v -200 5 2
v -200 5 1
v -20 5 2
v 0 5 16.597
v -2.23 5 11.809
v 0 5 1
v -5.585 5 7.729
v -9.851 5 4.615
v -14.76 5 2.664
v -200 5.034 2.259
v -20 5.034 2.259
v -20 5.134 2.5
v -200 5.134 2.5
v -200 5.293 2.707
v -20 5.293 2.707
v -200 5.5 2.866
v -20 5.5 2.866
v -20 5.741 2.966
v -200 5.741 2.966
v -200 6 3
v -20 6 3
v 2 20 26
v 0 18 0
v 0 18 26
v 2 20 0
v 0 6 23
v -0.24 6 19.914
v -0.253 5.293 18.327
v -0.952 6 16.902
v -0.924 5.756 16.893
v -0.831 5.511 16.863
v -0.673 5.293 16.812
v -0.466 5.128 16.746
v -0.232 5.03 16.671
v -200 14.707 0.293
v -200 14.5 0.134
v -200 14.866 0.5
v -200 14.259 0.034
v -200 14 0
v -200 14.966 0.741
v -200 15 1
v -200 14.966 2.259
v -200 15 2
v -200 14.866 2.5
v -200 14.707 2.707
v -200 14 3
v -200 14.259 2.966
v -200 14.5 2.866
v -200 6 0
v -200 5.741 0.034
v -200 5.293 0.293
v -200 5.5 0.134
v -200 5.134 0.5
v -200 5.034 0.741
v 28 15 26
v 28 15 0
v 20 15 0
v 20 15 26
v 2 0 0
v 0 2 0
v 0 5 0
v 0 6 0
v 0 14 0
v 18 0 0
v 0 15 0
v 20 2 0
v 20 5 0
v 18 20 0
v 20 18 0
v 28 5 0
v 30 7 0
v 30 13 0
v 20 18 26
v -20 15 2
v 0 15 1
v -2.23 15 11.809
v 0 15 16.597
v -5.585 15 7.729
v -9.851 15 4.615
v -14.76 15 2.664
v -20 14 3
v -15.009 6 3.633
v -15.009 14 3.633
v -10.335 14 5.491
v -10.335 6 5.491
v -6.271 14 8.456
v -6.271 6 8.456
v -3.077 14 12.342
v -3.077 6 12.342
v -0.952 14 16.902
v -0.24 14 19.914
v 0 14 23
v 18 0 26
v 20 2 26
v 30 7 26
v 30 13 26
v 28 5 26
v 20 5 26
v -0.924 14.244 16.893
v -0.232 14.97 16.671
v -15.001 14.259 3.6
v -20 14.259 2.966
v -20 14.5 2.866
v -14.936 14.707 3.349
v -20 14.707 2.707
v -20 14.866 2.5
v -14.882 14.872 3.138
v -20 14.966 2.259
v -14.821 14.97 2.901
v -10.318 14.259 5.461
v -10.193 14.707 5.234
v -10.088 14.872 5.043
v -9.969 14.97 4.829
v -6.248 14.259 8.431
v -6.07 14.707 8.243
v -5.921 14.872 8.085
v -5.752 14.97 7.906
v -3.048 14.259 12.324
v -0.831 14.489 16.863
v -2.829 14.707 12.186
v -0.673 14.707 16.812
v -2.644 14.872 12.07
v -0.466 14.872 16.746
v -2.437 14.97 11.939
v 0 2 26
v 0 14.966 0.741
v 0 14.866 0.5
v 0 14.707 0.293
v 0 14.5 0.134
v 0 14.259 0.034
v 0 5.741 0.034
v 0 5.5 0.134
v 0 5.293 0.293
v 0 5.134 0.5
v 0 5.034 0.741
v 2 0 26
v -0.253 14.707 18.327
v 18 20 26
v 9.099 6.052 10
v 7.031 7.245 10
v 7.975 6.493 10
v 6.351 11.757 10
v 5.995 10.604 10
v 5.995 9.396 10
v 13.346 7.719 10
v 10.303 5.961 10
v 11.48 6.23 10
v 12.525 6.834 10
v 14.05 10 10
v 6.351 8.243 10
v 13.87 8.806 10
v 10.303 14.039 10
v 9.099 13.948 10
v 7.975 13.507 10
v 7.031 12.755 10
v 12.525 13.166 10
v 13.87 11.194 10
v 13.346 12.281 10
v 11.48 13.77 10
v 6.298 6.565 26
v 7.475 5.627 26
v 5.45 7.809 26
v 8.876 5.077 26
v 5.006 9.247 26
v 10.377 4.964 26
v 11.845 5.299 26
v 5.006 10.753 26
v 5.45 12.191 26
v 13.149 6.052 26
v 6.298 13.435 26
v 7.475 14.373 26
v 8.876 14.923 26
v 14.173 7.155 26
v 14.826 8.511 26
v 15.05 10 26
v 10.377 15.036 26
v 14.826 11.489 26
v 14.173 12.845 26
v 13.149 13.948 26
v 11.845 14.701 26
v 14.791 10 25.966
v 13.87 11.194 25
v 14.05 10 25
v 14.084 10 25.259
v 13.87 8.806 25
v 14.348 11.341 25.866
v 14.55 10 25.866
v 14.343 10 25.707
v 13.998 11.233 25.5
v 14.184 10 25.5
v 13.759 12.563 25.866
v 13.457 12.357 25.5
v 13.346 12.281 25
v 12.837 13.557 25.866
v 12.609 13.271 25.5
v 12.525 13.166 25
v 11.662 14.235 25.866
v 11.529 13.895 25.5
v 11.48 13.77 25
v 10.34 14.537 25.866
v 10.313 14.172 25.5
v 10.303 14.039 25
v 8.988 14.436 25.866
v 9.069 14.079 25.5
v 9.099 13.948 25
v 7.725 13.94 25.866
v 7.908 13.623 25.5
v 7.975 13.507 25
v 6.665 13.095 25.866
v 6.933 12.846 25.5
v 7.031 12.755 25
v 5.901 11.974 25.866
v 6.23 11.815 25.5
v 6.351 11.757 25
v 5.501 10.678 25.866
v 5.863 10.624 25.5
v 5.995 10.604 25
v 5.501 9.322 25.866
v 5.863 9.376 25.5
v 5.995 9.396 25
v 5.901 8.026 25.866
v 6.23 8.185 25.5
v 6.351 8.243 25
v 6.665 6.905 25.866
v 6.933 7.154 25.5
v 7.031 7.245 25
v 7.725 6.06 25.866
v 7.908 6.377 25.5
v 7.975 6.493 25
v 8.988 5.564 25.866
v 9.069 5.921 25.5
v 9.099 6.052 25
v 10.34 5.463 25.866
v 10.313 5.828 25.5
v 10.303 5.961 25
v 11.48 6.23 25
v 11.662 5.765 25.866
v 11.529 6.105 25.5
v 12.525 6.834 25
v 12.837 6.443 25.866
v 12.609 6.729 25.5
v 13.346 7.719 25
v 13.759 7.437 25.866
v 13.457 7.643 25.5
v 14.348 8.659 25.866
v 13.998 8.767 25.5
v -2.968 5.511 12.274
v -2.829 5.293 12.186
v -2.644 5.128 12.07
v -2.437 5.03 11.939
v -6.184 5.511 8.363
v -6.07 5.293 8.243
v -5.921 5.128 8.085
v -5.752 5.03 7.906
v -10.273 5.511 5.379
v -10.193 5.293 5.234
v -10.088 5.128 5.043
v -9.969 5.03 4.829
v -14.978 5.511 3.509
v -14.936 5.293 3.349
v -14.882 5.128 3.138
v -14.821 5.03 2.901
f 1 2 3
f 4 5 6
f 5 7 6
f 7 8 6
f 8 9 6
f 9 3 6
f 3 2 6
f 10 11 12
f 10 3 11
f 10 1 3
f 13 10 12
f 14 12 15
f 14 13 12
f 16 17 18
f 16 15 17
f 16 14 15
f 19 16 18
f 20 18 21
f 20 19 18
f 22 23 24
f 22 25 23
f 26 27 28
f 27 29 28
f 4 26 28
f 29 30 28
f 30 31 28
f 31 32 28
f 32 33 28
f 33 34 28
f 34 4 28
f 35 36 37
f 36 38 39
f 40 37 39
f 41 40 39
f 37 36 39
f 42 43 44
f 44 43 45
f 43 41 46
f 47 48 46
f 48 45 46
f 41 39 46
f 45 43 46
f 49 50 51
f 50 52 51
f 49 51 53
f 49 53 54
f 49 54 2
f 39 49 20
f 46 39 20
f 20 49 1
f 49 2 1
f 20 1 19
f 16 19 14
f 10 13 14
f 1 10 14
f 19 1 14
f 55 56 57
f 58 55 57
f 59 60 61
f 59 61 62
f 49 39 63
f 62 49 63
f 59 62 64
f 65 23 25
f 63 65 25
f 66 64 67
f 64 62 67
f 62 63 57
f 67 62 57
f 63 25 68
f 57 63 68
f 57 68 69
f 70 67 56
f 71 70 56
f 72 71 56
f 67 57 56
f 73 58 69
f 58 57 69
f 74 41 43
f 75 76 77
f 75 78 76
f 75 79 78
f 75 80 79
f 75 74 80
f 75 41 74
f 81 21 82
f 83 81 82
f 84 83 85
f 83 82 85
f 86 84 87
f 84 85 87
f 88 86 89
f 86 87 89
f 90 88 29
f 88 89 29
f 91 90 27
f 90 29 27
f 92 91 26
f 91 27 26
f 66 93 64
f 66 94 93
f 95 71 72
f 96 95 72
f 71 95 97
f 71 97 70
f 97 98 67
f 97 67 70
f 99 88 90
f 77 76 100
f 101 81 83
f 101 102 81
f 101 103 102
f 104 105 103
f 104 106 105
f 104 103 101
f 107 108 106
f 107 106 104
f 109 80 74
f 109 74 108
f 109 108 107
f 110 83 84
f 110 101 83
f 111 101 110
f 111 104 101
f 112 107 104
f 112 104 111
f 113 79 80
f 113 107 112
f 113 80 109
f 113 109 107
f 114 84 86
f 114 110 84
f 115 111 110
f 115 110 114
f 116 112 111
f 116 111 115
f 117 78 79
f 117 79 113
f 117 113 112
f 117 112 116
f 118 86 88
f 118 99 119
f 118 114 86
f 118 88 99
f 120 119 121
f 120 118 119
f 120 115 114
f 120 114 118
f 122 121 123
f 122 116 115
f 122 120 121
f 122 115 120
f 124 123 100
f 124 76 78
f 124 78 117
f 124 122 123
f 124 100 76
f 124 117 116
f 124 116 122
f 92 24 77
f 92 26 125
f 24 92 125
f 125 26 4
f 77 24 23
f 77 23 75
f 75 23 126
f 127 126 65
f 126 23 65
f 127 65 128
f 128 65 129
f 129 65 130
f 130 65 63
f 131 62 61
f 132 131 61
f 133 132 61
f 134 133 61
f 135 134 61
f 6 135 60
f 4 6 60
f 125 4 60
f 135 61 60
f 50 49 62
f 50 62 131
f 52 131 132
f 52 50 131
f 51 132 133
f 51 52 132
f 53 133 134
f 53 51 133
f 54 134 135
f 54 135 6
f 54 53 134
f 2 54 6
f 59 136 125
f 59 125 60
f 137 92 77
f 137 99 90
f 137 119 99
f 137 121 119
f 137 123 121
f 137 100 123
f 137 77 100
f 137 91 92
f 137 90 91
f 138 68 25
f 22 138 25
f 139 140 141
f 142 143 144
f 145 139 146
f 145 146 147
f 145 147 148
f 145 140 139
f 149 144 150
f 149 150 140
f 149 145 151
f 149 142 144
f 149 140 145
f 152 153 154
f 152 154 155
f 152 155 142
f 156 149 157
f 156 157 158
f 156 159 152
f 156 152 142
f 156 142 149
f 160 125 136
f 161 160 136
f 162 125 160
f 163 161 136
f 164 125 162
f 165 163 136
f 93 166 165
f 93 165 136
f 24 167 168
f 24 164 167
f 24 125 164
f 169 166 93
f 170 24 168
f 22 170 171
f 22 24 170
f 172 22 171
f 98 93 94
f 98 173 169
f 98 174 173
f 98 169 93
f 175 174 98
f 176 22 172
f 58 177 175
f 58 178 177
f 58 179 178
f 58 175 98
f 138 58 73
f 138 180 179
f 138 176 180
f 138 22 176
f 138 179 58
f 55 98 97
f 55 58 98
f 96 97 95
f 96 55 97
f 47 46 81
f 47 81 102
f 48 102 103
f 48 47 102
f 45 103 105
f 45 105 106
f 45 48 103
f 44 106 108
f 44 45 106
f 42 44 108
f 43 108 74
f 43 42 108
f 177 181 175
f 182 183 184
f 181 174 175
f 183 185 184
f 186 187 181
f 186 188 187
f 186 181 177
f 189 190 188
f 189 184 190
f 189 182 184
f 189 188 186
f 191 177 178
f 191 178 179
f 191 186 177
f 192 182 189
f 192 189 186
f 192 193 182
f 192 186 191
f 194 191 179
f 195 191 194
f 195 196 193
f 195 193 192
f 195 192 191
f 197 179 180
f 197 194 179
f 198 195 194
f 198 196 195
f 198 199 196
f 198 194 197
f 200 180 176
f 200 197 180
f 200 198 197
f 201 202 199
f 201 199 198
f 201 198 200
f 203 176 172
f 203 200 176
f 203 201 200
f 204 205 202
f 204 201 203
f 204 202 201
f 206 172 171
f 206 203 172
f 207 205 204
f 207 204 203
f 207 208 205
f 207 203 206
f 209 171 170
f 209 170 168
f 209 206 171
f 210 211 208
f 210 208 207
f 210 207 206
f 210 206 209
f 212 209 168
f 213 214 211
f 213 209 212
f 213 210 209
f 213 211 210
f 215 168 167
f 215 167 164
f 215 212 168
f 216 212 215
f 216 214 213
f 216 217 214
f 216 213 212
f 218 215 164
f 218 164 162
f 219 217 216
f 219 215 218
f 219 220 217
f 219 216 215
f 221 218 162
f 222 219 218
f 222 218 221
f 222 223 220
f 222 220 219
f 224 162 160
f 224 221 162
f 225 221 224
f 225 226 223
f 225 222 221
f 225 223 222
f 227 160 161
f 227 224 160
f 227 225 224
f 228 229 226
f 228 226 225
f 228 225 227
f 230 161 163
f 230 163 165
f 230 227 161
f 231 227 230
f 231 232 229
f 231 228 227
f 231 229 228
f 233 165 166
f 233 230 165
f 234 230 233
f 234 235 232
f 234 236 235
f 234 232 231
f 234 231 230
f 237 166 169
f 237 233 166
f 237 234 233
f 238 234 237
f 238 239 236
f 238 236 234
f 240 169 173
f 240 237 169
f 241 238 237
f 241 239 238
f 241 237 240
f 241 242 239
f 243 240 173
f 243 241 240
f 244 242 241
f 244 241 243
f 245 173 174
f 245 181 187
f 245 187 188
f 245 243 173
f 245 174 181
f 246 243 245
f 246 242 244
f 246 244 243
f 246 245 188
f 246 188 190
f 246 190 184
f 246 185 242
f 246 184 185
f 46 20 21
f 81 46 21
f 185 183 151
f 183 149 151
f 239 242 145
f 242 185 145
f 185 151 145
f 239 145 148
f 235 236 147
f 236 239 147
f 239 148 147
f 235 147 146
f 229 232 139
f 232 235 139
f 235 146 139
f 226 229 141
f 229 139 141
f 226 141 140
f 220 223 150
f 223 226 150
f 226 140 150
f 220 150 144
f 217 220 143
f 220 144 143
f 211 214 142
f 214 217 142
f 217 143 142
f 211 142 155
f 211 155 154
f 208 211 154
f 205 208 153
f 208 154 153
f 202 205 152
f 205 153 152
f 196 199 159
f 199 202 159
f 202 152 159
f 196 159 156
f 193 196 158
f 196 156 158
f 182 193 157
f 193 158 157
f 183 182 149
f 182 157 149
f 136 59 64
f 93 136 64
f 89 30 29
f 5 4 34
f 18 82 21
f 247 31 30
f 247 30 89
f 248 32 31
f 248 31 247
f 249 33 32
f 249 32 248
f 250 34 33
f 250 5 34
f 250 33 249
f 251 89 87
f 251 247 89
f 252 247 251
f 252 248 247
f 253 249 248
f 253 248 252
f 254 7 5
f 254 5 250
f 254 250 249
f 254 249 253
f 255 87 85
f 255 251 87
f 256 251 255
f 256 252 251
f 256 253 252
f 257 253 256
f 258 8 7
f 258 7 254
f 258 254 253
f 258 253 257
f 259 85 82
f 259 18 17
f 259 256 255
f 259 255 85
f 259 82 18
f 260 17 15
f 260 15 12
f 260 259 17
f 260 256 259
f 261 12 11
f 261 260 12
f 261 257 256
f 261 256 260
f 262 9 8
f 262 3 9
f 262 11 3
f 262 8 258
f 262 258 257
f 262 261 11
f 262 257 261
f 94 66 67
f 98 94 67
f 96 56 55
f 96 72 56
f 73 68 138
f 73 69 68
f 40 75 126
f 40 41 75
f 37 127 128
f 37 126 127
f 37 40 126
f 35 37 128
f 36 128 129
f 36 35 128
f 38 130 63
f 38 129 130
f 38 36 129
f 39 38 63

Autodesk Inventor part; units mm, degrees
ref_plane "YZ Plane" through (0, 0, 0) normal (1, 0, 0) x (0, 1, 0)
ref_plane "XZ Plane" through (0, 0, 0) normal (0, 1, 0) x (-1, 0, 0)
sketch "Sketch1" plane through (0, 0, 0) normal (0, 0, 1) x (1, 0, 0)
  line L0 (0, 0) -> (20, 0)
  line L1 (20, 0) -> (20, 20)
  line L2 (20, 20) -> (0, 20)
  line L3 (0, 20) -> (0, 0)
  line L4 (-10, 5) -> (30, 5)
  line L5 (30, 5) -> (30, 15)
  line L6 (30, 15) -> (-10, 15)
  line L7 (-10, 15) -> (-10, 5)
  line L8 (-10, 5) -> (30, 15) construction
  line L9 (30, 5) -> (-10, 15) construction
  circle A0 centre (10, 10) radius 4.05
  point P0 (20, 5)
  point P1 (20, 15)
  dimension "d0" = 20
  dimension "d1" = 20
  dimension "d2" = 40
  dimension "d3" = 10
  dimension "d4" = 10
  dimension "d5" = 10
  dimension "d6" = 8.1
extrude "Extrusion1" add sketch "Sketch1" along normal blind 26 contours L3 L4 L1 L0 | L3 L6 L1 L4 | L1 L6 L5 L4 | L3 L2 L1 L6
chamfer "Chamfer1" distance 2 angle 45 6 edges at (20, 20, 13) (30, 15, 13) (30, 5, 13) (20, 0, 13) (0, 20, 13) (0, 0, 13)
extrude "Extrusion2" add sketch "Sketch1" along normal blind 10 contours A0
fillet "Fillet2" radius 1 1 edges at (5.95, 10, 26)
ref_plane "Work Plane1" through (10, 10, 0) normal (0, 1, 0) x (1, 0, 0)
sketch "Sketch2" plane through (10, 10, 0) normal (0, 1, 0) x (1, 0, 0)
  line L0 (-10, 0) -> (-210, 0)
  line L1 (-210, 0) -> (-210, -3)
  line L2 (-210, -3) -> (-30, -3)
  line L3 (-10, 0) -> (-10, -26) projected
  line L4 (-10, -23) -> (-10, -26)
  arc A0 (-10, -23) -> (-30, -3) centre (-30, -23) ccw
  point P0 (-10, -3)
  dimension "d16" = 200
  dimension "d17" = 3
  dimension "d18" = 200
  dimension "d19" = 90
  dimension "d20" = 20
extrude "Extrusion3" add sketch "Sketch2" along normal mid plane 10
fillet "Fillet3" radius 1 6 edges at (-100, 5, 0) (-100, 15, 0) (-5.8579, 5, 8.8579) (-110, 5, 3) (-5.8579, 15, 8.8579) (-110, 15, 3)
properties part number "Turret_Holder_2_test"
